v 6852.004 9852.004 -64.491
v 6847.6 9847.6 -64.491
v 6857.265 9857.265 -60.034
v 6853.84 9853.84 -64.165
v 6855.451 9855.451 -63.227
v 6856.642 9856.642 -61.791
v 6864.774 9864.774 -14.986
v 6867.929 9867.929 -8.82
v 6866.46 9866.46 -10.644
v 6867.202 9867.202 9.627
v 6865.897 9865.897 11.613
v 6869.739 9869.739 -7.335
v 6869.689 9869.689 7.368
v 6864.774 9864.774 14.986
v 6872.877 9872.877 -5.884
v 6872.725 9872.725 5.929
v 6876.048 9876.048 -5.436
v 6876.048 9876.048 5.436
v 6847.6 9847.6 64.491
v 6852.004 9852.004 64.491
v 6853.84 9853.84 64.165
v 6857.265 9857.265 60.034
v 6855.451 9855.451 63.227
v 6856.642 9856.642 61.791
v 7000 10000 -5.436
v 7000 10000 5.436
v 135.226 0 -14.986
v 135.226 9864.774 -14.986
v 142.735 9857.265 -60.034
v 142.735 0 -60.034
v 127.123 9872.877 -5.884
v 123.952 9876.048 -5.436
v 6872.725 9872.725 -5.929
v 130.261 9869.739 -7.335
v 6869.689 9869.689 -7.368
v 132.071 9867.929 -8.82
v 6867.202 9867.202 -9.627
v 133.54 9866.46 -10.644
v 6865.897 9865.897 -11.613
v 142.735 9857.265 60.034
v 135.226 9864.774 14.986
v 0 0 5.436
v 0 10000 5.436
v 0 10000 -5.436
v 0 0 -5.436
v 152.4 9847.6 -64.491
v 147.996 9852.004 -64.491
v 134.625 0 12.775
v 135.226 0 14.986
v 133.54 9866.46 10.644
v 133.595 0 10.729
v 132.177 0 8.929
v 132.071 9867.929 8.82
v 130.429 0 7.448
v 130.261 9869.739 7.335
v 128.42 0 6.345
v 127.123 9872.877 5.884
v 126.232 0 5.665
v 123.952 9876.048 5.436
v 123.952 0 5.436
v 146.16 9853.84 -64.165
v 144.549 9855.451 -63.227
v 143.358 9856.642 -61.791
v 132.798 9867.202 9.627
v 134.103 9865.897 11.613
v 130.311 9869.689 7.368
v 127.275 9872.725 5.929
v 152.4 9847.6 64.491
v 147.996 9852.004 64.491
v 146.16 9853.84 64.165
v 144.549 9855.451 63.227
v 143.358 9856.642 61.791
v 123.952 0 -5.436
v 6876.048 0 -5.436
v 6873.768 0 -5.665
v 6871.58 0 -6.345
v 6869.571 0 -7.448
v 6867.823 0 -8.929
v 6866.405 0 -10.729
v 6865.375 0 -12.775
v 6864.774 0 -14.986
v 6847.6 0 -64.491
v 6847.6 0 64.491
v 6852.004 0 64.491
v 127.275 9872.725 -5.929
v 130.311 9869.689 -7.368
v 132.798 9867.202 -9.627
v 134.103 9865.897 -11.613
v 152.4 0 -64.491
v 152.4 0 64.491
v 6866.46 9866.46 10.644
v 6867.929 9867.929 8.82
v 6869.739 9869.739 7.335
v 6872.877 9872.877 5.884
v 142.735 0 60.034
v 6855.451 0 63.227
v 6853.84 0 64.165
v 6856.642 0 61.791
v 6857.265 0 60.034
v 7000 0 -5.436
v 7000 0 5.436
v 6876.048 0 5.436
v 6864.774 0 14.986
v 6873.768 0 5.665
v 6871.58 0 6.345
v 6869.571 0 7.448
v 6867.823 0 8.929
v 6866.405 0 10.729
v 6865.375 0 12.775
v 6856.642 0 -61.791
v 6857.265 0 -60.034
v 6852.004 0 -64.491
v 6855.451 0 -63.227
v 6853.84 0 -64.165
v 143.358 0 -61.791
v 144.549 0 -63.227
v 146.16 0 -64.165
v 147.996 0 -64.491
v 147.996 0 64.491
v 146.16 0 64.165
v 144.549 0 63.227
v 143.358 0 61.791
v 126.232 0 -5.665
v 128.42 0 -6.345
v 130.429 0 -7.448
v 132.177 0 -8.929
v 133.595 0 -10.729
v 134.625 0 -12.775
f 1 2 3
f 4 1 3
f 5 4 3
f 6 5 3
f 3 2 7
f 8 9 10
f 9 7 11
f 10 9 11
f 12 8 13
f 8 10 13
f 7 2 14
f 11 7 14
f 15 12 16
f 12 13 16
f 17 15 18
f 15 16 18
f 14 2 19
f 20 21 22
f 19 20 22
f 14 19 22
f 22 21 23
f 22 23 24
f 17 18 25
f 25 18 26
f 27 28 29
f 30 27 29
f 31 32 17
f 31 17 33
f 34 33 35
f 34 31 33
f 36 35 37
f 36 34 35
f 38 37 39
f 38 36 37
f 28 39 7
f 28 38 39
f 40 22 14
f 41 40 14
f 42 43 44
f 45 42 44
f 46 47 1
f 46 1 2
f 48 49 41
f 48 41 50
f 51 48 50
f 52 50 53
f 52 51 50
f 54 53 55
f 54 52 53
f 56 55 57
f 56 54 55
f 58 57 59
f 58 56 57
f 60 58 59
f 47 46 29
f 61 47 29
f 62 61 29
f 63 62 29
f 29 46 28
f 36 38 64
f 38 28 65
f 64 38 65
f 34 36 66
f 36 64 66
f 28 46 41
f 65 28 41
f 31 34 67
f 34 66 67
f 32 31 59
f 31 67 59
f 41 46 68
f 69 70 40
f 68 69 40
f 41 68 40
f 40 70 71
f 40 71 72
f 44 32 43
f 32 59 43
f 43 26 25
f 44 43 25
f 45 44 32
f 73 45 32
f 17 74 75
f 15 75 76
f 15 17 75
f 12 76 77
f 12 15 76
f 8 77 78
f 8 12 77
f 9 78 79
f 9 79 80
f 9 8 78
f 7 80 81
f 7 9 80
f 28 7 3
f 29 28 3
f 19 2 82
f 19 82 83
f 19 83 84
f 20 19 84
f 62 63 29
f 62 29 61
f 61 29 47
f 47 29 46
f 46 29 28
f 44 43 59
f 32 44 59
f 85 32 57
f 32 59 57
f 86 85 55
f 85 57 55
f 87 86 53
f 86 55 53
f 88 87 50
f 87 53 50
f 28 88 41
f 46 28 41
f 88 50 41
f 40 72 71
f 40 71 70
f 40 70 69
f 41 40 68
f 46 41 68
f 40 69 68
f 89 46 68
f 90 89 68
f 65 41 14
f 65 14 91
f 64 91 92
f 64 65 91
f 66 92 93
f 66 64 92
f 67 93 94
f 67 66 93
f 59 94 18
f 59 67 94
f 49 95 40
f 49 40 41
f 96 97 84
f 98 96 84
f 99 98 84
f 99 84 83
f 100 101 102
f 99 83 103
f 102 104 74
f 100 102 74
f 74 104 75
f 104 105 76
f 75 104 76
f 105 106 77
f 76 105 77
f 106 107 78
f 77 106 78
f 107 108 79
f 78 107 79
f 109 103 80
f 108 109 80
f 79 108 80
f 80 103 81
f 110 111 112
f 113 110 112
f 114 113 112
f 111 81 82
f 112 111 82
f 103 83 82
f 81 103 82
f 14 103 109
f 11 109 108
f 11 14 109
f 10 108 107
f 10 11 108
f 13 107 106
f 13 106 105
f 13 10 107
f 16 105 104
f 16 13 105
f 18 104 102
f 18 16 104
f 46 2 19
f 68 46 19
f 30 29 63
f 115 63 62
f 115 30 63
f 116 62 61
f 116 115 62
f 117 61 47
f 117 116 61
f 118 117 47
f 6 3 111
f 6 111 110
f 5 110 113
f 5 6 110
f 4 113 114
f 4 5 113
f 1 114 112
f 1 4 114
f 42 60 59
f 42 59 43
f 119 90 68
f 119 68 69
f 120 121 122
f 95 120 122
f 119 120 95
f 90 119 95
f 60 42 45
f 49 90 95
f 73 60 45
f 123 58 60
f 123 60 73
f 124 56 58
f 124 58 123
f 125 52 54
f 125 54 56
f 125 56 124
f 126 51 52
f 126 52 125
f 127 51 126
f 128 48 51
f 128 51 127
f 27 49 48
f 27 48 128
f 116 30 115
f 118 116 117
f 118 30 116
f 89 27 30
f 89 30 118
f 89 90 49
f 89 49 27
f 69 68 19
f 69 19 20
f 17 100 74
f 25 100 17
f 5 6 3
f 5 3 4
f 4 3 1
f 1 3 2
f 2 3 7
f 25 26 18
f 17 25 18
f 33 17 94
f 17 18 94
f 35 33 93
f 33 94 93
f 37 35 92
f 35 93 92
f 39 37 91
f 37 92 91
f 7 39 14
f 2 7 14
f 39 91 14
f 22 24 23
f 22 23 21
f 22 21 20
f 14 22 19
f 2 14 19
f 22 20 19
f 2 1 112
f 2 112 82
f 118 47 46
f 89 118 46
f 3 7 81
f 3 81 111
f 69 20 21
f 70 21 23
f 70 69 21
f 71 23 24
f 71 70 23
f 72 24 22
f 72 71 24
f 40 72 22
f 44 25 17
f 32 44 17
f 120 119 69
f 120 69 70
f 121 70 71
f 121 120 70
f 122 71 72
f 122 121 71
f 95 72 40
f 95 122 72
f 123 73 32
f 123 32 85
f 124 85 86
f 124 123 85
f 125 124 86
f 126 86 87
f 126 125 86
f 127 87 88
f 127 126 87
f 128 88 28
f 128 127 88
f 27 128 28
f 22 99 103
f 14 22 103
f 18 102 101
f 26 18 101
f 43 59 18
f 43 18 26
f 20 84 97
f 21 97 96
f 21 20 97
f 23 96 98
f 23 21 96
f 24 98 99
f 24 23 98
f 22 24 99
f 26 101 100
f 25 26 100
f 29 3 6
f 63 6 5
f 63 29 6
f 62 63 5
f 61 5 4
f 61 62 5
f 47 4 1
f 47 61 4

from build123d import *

# Parameters (mm, degrees)
ST_SECTION_ST6X17_5_2_DEPTH   = 10166.483526335
ST_SECTION_ST6X17_5_2_2_DEPTH = 7332.967052671
ST_SECTION_ST6X17_5_2_3_DEPTH = 10166.483526336


with BuildPart() as part:
    # Sketch12 → St section ST6X17.5(2) (new body)
    with BuildSketch(Plane.ZX):
        with BuildLine():
            Line((-64.4906, 152.4), (64.4906, 152.4))
            Line((64.4906, 152.4), (64.4906, 147.996286207))
            ThreePointArc((64.4906, 147.996286207), (63.226568979, 144.548546584), (60.033566439, 142.734871391))
            Line((60.033566439, 142.734871391), (14.986386201, 135.22646032))
            ThreePointArc((14.986386201, 135.22646032), (8.144237901, 131.340013477), (5.4356, 123.952))
            Line((5.4356, 123.952), (5.4356, 0))
            Line((5.4356, 0), (-5.4356, 0))
            Line((-5.4356, 0), (-5.4356, 123.952))
            ThreePointArc((-5.4356, 123.952), (-8.144237901, 131.340013477), (-14.986386201, 135.22646032))
            Line((-14.986386201, 135.22646032), (-60.033566439, 142.734871391))
            ThreePointArc((-60.033566439, 142.734871391), (-63.226568979, 144.548546584), (-64.4906, 147.996286207))
            Line((-64.4906, 147.996286207), (-64.4906, 152.4))
        make_face()
    extrude(amount=ST_SECTION_ST6X17_5_2_DEPTH)

    # St section ST6X17.5(2) mitre 1
    split(bisect_by=Plane(origin=(0, 10000, 0), x_dir=(0.707106781, -0.707106781, 0), z_dir=(-0.707106781, -0.707106781, 0)), keep=Keep.TOP)


with BuildPart() as body_2:
    # Sketch12 on segment 2 (carried to segment 2) → St section ST6X17.5_2 2 (new body)
    with BuildSketch(Plane(origin=(-166.483526335, 10000, 0), x_dir=(0, 0, 1), z_dir=(1, 0, 0))):
        with BuildLine():
            Line((-64.4906, 152.4), (64.4906, 152.4))
            Line((64.4906, 152.4), (64.4906, 147.996286207))
            ThreePointArc((64.4906, 147.996286207), (63.226568979, 144.548546584), (60.033566439, 142.734871391))
            Line((60.033566439, 142.734871391), (14.986386201, 135.22646032))
            ThreePointArc((14.986386201, 135.22646032), (8.144237901, 131.340013477), (5.4356, 123.952))
            Line((5.4356, 123.952), (5.4356, 0))
            Line((5.4356, 0), (-5.4356, 0))
            Line((-5.4356, 0), (-5.4356, 123.952))
            ThreePointArc((-5.4356, 123.952), (-8.144237901, 131.340013477), (-14.986386201, 135.22646032))
            Line((-14.986386201, 135.22646032), (-60.033566439, 142.734871391))
            ThreePointArc((-60.033566439, 142.734871391), (-63.226568979, 144.548546584), (-64.4906, 147.996286207))
            Line((-64.4906, 147.996286207), (-64.4906, 152.4))
        make_face()
    extrude(amount=ST_SECTION_ST6X17_5_2_2_DEPTH)

    # St section ST6X17.5_2 2 mitre 1
    split(bisect_by=Plane(origin=(0, 10000, 0), x_dir=(-0.707106781, 0.707106781, 0), z_dir=(0.707106781, 0.707106781, 0)), keep=Keep.TOP)

    # St section ST6X17.5_2 2 mitre 2
    split(bisect_by=Plane(origin=(7000, 10000, 0), x_dir=(-0.707106781, -0.707106781, 0), z_dir=(-0.707106781, 0.707106781, 0)), keep=Keep.TOP)


with BuildPart() as body_3:
    # Sketch12 on segment 3 (carried to segment 3) → St section ST6X17.5_2 3 (new body)
    with BuildSketch(Plane(origin=(7000, 10166.483526335, 0), x_dir=(0, 0, 1), z_dir=(0, -1, 0))):
        with BuildLine():
            Line((-64.4906, 152.4), (64.4906, 152.4))
            Line((64.4906, 152.4), (64.4906, 147.996286207))
            ThreePointArc((64.4906, 147.996286207), (63.226568979, 144.548546584), (60.033566439, 142.734871391))
            Line((60.033566439, 142.734871391), (14.986386201, 135.22646032))
            ThreePointArc((14.986386201, 135.22646032), (8.144237901, 131.340013477), (5.4356, 123.952))
            Line((5.4356, 123.952), (5.4356, 0))
            Line((5.4356, 0), (-5.4356, 0))
            Line((-5.4356, 0), (-5.4356, 123.952))
            ThreePointArc((-5.4356, 123.952), (-8.144237901, 131.340013477), (-14.986386201, 135.22646032))
            Line((-14.986386201, 135.22646032), (-60.033566439, 142.734871391))
            ThreePointArc((-60.033566439, 142.734871391), (-63.226568979, 144.548546584), (-64.4906, 147.996286207))
            Line((-64.4906, 147.996286207), (-64.4906, 152.4))
        make_face()
    extrude(amount=ST_SECTION_ST6X17_5_2_3_DEPTH)

    # St section ST6X17.5_2 3 mitre 1
    split(bisect_by=Plane(origin=(7000, 10000, 0), x_dir=(0.707106781, 0.707106781, 0), z_dir=(0.707106781, -0.707106781, 0)), keep=Keep.TOP)


solid = Compound([part.part, body_2.part, body_3.part])
